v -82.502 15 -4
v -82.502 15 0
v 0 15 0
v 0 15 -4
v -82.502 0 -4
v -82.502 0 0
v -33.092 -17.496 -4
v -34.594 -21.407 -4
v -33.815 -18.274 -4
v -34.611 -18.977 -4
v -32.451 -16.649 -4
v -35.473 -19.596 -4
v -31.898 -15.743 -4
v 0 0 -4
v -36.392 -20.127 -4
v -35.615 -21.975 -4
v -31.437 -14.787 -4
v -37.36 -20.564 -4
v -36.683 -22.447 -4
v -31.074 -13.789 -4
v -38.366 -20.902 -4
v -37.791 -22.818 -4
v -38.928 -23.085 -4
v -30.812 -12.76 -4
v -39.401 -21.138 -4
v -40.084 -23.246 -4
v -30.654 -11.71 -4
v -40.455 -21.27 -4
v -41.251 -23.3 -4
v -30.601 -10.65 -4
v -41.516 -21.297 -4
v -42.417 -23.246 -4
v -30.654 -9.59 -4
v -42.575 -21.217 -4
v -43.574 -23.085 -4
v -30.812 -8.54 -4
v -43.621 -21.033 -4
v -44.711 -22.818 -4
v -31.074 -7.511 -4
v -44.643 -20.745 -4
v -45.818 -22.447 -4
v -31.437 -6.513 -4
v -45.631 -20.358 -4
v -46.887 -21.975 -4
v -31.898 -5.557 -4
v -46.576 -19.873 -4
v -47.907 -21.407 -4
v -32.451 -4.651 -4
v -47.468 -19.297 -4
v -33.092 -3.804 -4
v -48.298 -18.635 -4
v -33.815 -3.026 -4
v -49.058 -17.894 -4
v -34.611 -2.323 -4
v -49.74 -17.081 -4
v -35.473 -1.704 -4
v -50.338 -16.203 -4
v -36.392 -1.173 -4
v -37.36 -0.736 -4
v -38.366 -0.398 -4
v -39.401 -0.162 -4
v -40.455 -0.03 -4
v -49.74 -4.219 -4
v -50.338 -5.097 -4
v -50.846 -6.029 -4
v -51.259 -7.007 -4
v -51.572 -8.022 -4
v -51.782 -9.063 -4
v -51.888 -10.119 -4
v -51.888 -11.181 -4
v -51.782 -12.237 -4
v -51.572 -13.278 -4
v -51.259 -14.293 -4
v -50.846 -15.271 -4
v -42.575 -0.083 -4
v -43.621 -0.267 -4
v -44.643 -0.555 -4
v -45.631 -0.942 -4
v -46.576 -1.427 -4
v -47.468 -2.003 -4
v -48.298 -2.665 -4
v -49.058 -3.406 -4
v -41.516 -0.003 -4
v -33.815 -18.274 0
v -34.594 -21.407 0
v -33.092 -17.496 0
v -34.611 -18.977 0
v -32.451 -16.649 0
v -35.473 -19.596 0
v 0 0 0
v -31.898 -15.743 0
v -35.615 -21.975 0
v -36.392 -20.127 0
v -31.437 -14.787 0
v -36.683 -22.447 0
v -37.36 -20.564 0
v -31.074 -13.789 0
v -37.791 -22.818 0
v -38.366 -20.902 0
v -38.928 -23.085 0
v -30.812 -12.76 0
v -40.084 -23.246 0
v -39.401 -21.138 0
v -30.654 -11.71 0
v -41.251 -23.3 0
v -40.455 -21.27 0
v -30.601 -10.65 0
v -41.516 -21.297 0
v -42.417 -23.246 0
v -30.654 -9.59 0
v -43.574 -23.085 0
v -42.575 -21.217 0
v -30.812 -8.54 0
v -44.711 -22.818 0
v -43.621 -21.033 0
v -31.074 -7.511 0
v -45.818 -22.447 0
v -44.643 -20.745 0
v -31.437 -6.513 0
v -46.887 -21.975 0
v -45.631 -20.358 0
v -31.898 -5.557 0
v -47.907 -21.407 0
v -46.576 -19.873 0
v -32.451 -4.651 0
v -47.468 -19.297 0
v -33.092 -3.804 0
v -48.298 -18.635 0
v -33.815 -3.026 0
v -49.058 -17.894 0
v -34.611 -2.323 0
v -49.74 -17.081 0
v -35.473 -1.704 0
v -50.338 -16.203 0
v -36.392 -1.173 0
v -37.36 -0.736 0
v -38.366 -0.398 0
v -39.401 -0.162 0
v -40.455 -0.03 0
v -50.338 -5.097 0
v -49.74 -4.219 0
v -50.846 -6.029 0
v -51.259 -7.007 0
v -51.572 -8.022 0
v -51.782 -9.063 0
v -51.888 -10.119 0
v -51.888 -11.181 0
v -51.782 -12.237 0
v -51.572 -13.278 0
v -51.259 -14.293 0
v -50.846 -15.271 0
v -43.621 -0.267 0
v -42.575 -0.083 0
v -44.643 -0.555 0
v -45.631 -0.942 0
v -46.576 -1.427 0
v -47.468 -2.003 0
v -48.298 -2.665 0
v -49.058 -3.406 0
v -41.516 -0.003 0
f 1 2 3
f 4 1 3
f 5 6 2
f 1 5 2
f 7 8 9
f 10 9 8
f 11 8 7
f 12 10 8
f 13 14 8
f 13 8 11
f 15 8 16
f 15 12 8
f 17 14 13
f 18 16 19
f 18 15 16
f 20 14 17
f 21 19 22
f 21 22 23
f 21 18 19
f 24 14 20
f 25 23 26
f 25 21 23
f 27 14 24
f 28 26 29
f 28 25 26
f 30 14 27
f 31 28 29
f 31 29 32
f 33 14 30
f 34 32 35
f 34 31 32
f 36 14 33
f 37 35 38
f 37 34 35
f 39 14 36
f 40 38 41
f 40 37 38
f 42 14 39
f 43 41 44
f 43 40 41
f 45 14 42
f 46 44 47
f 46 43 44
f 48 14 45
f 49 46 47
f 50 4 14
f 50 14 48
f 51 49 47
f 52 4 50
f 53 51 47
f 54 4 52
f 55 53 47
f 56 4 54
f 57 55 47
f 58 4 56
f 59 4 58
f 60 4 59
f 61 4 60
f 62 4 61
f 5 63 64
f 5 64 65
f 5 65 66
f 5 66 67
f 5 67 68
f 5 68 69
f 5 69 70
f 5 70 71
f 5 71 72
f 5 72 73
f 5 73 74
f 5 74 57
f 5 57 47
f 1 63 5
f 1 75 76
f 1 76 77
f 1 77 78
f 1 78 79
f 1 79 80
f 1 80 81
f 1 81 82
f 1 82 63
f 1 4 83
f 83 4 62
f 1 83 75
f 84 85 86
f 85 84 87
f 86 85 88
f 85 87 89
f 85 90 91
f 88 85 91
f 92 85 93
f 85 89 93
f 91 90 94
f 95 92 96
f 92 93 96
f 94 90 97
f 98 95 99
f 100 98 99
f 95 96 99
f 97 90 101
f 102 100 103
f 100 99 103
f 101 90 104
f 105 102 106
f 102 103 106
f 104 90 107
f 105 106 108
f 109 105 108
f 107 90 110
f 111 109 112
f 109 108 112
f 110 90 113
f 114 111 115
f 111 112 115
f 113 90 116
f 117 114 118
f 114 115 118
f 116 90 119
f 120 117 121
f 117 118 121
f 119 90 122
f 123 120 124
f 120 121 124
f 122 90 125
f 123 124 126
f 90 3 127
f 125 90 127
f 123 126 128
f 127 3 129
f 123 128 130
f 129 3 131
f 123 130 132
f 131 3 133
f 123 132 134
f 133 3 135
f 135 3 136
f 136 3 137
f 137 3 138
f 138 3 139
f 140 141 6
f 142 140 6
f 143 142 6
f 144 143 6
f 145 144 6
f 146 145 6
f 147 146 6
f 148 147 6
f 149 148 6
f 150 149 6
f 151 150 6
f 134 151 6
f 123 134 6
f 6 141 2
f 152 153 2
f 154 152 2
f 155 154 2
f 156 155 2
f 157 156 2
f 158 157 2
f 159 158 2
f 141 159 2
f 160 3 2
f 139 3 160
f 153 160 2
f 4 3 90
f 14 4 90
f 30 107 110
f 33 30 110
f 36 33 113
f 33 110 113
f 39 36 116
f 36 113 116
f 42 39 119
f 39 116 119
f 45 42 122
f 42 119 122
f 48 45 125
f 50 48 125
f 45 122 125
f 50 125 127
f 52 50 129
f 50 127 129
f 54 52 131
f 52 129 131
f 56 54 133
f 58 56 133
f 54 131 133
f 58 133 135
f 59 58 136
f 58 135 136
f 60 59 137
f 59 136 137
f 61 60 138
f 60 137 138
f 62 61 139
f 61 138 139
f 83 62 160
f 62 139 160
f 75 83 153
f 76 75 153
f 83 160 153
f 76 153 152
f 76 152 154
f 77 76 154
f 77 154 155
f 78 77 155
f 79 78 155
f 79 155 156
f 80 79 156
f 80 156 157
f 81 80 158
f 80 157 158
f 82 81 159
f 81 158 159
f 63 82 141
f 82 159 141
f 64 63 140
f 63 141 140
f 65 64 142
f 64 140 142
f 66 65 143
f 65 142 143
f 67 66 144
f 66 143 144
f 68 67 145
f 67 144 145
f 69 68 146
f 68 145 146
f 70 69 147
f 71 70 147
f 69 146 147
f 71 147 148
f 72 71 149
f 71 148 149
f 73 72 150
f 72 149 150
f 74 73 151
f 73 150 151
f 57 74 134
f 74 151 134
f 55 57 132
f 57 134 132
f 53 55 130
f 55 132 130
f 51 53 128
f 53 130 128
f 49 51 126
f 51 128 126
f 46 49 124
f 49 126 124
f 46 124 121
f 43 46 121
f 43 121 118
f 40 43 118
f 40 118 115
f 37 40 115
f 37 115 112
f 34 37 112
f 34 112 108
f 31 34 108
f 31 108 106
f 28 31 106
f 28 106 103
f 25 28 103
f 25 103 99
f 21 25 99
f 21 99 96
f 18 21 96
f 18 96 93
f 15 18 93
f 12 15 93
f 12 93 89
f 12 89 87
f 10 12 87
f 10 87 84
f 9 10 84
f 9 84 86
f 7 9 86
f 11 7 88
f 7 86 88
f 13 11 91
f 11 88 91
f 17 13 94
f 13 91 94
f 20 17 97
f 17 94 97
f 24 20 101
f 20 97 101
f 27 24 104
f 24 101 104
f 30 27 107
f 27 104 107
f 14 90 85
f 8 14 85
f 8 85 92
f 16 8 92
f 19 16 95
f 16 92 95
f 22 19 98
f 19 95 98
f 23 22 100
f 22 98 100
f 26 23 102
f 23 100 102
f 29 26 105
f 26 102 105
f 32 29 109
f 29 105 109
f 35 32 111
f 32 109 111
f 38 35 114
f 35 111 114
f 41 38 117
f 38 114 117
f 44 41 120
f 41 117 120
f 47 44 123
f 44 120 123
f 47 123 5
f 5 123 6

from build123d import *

# Parameters (mm, degrees)
SKETCH_1_R             = 10.65
SM_BASE_FLANGE_1_DEPTH = 4


# Sheet-metal steps are written as plain solids
with BuildPart() as part:
    # Sketch 1 → Базовая кромка1 (new body)
    with BuildSketch(Plane.XY):
        with BuildLine():
            Line((0, 0), (-34.594362709, -21.407039383))
            ThreePointArc((-34.594362709, -21.407039383), (-41.250833524, -23.3), (-47.907304338, -21.407039383))
            Line((-47.907304338, -21.407039383), (-82.501667048, 0))
            Line((-82.501667048, 0), (-82.501667048, 15))
            Line((-82.501667048, 15), (0, 15))
            Line((0, 15), (0, 0))
        make_face()
        with Locations((-41.250833524, -10.65)):
            Circle(SKETCH_1_R, mode=Mode.SUBTRACT)
    extrude(amount=-SM_BASE_FLANGE_1_DEPTH)


solid = part.part
